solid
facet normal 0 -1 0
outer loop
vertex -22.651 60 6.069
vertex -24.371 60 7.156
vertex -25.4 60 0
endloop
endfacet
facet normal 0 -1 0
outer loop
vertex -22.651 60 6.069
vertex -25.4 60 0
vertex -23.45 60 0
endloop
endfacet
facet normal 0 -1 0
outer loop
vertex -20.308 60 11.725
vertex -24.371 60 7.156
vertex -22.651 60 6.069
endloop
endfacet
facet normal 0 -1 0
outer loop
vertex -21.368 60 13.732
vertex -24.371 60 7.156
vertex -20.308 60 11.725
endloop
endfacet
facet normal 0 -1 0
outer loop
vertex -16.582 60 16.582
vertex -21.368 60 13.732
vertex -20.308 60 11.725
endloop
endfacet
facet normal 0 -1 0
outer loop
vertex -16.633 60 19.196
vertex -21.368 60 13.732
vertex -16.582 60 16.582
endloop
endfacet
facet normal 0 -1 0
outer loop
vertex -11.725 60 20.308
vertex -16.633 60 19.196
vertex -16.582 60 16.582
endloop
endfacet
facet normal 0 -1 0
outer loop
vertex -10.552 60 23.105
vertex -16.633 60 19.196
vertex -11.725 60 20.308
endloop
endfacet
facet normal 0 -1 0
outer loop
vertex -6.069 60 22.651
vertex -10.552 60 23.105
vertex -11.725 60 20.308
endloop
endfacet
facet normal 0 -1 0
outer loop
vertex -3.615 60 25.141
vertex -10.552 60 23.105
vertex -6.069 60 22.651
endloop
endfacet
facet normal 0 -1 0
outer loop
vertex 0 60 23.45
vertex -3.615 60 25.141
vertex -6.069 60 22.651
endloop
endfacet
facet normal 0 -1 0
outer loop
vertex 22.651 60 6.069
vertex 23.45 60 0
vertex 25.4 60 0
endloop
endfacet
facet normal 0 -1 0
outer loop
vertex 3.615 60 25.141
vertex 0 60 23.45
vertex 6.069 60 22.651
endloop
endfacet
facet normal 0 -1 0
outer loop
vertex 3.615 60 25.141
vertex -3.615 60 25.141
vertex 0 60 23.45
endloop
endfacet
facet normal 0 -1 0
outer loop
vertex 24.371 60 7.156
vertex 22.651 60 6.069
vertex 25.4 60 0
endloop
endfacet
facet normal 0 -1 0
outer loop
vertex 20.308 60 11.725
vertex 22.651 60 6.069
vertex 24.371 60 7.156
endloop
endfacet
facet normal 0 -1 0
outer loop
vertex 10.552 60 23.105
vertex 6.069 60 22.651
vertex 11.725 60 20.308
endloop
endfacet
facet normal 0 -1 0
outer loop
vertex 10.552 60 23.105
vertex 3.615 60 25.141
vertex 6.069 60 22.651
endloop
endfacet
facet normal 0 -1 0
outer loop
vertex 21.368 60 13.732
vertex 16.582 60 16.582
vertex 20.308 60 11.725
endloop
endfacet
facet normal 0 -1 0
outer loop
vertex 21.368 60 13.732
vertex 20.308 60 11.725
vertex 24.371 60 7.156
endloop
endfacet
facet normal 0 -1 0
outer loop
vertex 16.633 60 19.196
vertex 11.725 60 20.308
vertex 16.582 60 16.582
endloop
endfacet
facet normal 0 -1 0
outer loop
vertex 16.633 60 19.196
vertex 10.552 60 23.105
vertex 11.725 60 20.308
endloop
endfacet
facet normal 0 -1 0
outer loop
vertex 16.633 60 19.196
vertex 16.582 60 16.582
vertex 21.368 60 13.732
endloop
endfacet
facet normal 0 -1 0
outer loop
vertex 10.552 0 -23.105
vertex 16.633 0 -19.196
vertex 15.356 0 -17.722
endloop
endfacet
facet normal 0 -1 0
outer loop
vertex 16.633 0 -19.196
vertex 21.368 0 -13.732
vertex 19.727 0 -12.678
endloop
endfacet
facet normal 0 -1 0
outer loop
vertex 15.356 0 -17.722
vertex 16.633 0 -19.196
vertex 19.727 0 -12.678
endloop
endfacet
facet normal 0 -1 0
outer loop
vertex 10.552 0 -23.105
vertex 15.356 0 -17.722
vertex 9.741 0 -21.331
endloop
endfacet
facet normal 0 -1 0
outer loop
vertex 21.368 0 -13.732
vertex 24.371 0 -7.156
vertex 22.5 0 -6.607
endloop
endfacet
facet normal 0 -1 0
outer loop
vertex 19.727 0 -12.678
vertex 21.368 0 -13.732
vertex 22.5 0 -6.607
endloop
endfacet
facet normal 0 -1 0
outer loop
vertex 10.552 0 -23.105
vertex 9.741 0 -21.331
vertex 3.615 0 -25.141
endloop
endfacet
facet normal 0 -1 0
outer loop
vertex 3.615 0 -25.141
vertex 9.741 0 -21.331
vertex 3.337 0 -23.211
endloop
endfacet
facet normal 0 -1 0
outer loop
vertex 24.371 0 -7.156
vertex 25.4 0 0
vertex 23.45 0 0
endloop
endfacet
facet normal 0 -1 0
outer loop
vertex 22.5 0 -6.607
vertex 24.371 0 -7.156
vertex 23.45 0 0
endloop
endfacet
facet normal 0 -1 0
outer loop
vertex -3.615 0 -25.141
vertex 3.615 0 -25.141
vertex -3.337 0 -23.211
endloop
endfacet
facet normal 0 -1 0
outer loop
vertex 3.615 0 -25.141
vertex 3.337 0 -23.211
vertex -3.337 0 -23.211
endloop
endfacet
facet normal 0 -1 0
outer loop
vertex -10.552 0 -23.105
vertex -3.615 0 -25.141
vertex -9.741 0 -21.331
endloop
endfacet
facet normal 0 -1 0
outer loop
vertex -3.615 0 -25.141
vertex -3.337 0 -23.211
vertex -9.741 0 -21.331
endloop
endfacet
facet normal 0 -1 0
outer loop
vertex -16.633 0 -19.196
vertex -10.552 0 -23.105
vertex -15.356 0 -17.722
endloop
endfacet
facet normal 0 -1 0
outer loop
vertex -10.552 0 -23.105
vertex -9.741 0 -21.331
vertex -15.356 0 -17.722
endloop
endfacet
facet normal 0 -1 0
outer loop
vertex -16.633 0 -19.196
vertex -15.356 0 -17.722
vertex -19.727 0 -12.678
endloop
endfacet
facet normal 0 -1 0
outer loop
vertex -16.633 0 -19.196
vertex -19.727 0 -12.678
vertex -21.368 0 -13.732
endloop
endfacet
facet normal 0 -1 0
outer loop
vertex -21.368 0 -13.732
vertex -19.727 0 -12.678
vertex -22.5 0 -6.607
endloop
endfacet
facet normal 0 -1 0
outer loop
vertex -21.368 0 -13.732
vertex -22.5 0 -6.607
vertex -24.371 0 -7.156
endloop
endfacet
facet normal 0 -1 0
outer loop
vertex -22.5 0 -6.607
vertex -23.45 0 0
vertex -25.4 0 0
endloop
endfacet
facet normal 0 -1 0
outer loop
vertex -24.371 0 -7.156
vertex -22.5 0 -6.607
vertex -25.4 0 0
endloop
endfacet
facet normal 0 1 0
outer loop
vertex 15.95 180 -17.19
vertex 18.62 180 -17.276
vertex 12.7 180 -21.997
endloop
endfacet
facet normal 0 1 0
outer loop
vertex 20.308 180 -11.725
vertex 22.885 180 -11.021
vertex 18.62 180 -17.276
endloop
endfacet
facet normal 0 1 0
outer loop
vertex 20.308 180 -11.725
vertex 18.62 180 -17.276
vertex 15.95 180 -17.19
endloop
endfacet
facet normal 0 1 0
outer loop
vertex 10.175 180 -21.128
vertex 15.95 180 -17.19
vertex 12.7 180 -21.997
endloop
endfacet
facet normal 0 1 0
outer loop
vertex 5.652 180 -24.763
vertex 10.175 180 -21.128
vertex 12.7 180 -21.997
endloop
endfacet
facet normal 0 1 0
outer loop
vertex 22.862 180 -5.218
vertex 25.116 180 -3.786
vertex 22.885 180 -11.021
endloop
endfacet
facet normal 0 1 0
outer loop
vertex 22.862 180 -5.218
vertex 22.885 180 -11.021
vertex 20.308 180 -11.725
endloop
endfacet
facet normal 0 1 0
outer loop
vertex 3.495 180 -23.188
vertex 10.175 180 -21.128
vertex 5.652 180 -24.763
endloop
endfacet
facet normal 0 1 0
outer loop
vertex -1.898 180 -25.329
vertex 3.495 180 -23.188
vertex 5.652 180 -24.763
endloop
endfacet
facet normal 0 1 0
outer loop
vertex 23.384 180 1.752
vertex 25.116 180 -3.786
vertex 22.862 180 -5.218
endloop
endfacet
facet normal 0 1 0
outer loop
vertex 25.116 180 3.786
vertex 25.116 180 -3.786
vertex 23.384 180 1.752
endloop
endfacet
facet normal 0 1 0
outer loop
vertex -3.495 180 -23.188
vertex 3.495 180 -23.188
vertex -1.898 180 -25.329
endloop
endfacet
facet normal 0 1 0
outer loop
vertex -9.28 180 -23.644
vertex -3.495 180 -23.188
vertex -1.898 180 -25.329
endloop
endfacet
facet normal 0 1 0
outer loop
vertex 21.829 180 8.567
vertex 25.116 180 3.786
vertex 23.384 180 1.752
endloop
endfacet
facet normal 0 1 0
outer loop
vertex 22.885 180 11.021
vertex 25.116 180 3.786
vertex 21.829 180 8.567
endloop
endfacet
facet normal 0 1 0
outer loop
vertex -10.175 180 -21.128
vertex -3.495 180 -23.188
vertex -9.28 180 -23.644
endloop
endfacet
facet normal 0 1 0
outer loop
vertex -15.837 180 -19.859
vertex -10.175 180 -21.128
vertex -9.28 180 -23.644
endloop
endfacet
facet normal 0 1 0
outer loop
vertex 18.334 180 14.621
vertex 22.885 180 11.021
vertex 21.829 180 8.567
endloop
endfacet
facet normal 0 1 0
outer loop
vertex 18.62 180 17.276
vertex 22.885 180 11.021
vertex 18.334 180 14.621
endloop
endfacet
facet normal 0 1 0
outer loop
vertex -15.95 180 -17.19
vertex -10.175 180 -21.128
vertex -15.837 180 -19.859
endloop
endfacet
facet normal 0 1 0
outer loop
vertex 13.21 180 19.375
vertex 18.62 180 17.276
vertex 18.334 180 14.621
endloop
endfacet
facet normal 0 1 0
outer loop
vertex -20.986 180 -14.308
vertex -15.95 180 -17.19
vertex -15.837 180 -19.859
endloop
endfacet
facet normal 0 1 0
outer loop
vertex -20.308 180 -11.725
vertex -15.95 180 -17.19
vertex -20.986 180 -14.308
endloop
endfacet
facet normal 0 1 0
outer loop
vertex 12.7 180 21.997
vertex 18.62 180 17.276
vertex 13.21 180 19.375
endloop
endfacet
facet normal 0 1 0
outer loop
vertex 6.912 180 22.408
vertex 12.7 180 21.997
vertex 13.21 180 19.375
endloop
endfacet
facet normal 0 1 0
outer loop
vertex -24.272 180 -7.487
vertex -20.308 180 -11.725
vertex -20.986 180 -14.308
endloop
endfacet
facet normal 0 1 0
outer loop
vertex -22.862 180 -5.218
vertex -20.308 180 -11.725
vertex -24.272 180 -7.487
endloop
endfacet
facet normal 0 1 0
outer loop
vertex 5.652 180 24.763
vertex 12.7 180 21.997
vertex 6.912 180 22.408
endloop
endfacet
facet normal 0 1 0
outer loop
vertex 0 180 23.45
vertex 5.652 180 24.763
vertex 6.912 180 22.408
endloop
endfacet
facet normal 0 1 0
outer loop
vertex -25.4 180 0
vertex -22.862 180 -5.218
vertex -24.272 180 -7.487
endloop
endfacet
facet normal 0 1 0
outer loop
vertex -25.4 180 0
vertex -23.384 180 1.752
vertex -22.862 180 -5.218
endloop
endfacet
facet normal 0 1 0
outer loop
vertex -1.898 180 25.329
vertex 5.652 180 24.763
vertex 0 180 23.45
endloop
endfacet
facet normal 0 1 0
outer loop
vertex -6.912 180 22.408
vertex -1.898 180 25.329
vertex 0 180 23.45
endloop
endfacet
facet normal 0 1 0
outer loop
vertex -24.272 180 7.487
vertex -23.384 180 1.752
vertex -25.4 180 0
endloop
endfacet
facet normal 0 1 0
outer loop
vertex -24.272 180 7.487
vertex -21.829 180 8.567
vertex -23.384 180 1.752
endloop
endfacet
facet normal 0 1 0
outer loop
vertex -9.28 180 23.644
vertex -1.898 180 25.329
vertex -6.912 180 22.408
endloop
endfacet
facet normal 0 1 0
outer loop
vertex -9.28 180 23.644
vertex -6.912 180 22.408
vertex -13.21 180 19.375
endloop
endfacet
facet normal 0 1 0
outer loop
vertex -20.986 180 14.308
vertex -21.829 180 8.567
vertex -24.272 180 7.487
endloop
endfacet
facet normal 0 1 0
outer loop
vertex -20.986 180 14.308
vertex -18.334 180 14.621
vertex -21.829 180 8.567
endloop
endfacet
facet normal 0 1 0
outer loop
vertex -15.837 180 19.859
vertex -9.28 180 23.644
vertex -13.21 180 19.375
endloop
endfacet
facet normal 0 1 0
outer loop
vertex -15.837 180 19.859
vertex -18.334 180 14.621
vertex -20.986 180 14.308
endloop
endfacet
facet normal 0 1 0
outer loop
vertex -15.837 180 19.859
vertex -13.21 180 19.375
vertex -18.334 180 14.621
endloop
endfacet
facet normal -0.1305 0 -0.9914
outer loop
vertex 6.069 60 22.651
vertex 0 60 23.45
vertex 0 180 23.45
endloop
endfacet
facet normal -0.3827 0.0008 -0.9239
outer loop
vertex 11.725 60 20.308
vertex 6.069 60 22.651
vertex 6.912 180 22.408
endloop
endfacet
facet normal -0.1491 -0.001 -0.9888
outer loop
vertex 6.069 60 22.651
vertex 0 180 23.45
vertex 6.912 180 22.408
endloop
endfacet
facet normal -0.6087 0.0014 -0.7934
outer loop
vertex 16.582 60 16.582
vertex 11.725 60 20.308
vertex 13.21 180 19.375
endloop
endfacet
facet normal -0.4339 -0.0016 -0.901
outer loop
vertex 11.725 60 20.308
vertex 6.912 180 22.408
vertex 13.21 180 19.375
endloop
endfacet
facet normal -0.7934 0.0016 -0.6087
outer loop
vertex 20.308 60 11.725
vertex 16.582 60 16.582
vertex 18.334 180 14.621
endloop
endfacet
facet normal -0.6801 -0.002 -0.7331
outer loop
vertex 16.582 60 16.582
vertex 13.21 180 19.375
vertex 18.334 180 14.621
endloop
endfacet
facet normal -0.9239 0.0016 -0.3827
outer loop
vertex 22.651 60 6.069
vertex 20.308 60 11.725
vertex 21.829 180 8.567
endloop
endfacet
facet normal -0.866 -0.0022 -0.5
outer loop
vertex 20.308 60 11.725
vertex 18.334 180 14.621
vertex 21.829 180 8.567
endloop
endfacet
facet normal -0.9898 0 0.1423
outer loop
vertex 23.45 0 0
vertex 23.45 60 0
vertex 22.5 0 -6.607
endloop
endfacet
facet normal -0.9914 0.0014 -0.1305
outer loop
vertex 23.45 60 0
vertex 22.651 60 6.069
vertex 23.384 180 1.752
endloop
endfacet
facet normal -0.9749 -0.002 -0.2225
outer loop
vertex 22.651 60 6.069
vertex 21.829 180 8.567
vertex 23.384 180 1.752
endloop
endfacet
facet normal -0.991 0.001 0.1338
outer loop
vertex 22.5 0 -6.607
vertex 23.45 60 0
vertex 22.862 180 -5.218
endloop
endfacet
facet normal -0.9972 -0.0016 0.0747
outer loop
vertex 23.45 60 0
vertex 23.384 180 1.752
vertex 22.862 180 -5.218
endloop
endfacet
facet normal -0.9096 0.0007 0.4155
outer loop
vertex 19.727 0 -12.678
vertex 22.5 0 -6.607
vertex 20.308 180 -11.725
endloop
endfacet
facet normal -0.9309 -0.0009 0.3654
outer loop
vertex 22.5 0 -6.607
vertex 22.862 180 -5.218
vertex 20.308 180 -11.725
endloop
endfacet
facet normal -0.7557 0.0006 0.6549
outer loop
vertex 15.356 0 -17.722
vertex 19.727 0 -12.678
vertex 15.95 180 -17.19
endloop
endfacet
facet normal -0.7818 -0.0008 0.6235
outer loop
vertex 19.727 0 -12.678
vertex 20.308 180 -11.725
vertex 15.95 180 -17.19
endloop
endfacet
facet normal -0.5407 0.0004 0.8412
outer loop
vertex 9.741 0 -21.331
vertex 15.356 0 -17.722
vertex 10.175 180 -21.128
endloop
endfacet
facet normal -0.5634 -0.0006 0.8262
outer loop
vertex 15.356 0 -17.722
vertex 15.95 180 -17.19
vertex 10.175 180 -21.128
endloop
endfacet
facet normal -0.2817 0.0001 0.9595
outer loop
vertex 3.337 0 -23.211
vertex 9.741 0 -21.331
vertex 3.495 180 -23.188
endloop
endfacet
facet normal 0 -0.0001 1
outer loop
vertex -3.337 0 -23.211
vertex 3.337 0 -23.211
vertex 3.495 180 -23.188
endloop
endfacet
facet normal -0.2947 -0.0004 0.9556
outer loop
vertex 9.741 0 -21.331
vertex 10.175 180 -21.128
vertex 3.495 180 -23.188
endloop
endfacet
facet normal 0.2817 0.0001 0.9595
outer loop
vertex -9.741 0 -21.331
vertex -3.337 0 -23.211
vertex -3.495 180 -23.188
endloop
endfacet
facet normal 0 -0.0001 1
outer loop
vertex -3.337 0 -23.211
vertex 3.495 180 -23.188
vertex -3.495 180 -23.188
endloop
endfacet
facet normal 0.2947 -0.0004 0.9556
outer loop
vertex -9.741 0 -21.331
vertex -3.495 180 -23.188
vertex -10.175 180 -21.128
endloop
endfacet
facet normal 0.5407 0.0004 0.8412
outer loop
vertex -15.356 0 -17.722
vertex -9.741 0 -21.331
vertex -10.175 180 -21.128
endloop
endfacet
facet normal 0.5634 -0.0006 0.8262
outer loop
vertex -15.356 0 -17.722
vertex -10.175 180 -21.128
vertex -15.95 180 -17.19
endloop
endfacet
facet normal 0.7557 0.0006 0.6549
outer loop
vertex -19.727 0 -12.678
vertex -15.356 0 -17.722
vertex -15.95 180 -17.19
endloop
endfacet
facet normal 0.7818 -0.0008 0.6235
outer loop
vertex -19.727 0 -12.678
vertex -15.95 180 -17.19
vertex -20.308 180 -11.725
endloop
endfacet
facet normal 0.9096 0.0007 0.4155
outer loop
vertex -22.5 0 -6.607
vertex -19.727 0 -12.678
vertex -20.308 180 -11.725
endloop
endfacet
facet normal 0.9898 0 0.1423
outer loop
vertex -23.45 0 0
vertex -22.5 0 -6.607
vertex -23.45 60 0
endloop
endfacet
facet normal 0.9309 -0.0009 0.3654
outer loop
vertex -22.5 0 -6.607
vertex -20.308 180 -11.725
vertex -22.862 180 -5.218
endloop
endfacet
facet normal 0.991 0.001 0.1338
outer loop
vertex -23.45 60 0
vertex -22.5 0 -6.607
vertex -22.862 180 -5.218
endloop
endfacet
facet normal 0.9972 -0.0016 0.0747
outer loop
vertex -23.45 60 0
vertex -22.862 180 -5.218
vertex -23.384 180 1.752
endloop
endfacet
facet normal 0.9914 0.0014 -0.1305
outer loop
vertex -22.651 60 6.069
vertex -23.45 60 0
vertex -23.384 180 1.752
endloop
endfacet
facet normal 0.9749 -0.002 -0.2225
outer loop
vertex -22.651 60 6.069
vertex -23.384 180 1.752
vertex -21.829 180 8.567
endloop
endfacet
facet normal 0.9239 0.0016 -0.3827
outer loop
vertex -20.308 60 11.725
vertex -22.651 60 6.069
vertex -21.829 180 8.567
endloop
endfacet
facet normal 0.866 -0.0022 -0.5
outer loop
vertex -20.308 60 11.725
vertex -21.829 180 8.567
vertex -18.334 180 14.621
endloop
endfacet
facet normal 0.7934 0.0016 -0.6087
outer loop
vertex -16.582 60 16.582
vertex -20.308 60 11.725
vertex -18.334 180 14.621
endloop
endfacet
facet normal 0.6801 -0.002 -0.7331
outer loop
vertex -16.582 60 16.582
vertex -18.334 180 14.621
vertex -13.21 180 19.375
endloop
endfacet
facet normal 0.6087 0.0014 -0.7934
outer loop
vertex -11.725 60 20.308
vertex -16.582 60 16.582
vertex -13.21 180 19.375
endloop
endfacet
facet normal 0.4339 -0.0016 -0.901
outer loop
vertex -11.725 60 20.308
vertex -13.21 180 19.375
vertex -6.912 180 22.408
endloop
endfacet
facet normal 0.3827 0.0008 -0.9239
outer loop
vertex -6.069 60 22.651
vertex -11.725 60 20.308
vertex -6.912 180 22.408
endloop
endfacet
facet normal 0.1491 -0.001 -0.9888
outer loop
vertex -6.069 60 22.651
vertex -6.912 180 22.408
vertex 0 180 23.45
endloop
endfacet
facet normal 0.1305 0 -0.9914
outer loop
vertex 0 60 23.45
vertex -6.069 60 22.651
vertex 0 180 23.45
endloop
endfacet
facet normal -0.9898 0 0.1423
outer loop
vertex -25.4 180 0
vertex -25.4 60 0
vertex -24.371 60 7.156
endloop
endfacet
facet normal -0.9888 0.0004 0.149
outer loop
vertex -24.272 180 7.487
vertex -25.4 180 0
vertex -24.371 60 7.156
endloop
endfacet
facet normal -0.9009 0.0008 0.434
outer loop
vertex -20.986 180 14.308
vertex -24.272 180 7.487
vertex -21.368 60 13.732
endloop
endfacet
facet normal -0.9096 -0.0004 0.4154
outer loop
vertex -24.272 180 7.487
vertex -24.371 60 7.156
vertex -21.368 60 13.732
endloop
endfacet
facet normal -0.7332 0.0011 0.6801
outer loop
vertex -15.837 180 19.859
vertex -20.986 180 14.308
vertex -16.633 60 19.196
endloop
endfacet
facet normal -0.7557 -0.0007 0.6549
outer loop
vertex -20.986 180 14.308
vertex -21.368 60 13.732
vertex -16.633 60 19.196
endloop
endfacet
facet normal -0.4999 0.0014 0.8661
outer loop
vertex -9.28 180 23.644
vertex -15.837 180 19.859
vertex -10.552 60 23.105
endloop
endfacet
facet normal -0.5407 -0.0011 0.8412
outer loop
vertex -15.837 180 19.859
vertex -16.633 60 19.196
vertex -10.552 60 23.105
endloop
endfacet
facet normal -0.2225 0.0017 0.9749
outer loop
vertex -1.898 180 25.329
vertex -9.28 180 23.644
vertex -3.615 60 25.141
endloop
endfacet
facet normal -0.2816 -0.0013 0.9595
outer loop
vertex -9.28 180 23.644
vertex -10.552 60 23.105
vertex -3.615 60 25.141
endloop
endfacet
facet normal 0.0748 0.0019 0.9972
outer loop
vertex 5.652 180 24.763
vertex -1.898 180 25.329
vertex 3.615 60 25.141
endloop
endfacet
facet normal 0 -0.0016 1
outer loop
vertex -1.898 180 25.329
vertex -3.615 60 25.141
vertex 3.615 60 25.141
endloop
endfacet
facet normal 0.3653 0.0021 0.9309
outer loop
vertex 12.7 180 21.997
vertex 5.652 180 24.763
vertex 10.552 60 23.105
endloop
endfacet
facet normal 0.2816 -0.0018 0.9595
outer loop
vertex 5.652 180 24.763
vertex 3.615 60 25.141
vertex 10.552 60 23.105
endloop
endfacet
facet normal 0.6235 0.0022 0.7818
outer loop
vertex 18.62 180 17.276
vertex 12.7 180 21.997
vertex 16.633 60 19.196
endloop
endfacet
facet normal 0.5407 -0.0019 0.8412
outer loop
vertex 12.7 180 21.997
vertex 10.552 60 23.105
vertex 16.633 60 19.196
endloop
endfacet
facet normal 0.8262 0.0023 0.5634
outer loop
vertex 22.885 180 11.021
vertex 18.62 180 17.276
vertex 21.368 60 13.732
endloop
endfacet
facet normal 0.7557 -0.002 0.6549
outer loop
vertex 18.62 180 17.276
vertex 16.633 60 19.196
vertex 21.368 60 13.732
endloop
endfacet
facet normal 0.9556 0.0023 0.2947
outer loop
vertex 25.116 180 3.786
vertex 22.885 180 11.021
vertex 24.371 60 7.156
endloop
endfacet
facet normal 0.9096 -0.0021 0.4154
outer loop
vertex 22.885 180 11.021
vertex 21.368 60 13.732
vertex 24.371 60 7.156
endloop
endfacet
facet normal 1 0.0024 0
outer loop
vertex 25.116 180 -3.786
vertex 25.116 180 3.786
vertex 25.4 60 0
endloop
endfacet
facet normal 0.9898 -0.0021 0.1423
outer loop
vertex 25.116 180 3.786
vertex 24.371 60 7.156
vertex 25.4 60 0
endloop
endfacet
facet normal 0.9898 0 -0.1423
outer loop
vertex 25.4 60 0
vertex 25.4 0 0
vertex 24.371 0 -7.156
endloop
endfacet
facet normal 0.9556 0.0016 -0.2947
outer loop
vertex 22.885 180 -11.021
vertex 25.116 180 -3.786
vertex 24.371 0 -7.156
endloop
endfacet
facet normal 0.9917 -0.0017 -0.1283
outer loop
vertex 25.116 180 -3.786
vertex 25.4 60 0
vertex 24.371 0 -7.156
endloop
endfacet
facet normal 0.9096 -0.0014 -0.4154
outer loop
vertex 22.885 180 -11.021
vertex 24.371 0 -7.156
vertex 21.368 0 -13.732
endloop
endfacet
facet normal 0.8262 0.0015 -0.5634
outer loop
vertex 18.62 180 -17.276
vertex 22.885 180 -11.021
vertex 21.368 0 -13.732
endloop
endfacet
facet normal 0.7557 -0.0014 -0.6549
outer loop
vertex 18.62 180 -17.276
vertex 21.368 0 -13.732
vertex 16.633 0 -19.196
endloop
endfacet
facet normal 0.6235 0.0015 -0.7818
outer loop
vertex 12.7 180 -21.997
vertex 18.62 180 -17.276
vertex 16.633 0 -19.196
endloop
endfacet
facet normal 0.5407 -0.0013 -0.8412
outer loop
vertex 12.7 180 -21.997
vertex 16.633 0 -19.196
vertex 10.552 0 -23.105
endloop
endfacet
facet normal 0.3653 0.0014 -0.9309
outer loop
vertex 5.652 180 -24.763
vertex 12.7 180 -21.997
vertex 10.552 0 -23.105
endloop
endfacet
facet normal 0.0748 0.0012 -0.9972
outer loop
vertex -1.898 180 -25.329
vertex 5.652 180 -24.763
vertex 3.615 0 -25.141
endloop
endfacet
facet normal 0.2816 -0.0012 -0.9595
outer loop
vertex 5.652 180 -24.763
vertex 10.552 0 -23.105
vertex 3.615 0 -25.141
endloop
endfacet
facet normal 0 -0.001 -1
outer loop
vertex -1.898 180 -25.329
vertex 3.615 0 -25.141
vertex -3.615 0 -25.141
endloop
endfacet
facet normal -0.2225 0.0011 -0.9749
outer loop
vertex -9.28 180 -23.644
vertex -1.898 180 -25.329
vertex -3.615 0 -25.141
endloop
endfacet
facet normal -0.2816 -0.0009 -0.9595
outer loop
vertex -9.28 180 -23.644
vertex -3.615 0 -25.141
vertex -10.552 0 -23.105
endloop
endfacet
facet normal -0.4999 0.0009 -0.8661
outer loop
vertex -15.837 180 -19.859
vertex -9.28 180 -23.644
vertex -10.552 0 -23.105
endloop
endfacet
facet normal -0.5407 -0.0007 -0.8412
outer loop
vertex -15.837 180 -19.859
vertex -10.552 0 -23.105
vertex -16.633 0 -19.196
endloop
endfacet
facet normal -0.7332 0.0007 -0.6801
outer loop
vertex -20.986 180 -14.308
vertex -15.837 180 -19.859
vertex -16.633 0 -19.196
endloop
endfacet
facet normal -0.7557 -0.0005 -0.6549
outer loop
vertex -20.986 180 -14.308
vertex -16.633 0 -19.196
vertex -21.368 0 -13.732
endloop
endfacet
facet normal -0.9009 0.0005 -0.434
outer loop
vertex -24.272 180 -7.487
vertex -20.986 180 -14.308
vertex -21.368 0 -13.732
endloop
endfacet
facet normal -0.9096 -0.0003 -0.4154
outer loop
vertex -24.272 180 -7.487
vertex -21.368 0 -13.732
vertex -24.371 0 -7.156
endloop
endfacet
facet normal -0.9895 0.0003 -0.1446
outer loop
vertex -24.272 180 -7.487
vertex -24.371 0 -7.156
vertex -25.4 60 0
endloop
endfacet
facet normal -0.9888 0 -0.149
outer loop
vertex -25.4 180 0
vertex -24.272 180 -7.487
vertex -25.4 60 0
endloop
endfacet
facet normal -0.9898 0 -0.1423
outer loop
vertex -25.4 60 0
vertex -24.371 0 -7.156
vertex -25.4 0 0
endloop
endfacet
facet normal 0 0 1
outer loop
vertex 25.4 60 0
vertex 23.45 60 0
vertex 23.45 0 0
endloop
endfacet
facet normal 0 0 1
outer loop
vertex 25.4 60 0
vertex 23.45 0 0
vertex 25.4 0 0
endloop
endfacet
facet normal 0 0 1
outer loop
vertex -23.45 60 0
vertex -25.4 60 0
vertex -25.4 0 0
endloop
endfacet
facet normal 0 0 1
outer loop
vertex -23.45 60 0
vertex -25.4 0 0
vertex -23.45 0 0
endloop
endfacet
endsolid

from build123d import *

# Parameters (mm, degrees)
SKETCH1_R           = 25.4
BOSS_EXTRUDE1_DEPTH = 180
SKETCH2_R           = 23.45
CUT_EXTRUDE1_DEPTH  = 180
SKETCH4_W           = 79.8
SKETCH4_H           = 60
CUT_EXTRUDE2_DEPTH  = 50


with BuildPart() as part:
    # Sketch1 → Boss-Extrude1 (new body)
    with BuildSketch(Plane(origin=(0, 0, 0), x_dir=(1, 0, 0), z_dir=(0, 1, 0))):
        with Locations(Location((0, 0, 0), (0, 0, 180))):
            Circle(SKETCH1_R)
    extrude(amount=BOSS_EXTRUDE1_DEPTH)

    # Sketch2 → Cut-Extrude1 (cut)
    with BuildSketch(Plane(origin=(0, 180, 0), x_dir=(1, 0, 0), z_dir=(0, 1, 0))):
        with Locations(Location((0, 0, 0), (0, 0, 270))):
            Circle(SKETCH2_R)
    extrude(amount=-CUT_EXTRUDE1_DEPTH, mode=Mode.SUBTRACT)

    # Sketch4 → Cut-Extrude2 (cut)
    with BuildSketch(Plane.XY.offset(50)):
        with Locations((0, 30)):
            Rectangle(SKETCH4_W, SKETCH4_H)
    extrude(amount=-CUT_EXTRUDE2_DEPTH, mode=Mode.SUBTRACT)


solid = part.part
